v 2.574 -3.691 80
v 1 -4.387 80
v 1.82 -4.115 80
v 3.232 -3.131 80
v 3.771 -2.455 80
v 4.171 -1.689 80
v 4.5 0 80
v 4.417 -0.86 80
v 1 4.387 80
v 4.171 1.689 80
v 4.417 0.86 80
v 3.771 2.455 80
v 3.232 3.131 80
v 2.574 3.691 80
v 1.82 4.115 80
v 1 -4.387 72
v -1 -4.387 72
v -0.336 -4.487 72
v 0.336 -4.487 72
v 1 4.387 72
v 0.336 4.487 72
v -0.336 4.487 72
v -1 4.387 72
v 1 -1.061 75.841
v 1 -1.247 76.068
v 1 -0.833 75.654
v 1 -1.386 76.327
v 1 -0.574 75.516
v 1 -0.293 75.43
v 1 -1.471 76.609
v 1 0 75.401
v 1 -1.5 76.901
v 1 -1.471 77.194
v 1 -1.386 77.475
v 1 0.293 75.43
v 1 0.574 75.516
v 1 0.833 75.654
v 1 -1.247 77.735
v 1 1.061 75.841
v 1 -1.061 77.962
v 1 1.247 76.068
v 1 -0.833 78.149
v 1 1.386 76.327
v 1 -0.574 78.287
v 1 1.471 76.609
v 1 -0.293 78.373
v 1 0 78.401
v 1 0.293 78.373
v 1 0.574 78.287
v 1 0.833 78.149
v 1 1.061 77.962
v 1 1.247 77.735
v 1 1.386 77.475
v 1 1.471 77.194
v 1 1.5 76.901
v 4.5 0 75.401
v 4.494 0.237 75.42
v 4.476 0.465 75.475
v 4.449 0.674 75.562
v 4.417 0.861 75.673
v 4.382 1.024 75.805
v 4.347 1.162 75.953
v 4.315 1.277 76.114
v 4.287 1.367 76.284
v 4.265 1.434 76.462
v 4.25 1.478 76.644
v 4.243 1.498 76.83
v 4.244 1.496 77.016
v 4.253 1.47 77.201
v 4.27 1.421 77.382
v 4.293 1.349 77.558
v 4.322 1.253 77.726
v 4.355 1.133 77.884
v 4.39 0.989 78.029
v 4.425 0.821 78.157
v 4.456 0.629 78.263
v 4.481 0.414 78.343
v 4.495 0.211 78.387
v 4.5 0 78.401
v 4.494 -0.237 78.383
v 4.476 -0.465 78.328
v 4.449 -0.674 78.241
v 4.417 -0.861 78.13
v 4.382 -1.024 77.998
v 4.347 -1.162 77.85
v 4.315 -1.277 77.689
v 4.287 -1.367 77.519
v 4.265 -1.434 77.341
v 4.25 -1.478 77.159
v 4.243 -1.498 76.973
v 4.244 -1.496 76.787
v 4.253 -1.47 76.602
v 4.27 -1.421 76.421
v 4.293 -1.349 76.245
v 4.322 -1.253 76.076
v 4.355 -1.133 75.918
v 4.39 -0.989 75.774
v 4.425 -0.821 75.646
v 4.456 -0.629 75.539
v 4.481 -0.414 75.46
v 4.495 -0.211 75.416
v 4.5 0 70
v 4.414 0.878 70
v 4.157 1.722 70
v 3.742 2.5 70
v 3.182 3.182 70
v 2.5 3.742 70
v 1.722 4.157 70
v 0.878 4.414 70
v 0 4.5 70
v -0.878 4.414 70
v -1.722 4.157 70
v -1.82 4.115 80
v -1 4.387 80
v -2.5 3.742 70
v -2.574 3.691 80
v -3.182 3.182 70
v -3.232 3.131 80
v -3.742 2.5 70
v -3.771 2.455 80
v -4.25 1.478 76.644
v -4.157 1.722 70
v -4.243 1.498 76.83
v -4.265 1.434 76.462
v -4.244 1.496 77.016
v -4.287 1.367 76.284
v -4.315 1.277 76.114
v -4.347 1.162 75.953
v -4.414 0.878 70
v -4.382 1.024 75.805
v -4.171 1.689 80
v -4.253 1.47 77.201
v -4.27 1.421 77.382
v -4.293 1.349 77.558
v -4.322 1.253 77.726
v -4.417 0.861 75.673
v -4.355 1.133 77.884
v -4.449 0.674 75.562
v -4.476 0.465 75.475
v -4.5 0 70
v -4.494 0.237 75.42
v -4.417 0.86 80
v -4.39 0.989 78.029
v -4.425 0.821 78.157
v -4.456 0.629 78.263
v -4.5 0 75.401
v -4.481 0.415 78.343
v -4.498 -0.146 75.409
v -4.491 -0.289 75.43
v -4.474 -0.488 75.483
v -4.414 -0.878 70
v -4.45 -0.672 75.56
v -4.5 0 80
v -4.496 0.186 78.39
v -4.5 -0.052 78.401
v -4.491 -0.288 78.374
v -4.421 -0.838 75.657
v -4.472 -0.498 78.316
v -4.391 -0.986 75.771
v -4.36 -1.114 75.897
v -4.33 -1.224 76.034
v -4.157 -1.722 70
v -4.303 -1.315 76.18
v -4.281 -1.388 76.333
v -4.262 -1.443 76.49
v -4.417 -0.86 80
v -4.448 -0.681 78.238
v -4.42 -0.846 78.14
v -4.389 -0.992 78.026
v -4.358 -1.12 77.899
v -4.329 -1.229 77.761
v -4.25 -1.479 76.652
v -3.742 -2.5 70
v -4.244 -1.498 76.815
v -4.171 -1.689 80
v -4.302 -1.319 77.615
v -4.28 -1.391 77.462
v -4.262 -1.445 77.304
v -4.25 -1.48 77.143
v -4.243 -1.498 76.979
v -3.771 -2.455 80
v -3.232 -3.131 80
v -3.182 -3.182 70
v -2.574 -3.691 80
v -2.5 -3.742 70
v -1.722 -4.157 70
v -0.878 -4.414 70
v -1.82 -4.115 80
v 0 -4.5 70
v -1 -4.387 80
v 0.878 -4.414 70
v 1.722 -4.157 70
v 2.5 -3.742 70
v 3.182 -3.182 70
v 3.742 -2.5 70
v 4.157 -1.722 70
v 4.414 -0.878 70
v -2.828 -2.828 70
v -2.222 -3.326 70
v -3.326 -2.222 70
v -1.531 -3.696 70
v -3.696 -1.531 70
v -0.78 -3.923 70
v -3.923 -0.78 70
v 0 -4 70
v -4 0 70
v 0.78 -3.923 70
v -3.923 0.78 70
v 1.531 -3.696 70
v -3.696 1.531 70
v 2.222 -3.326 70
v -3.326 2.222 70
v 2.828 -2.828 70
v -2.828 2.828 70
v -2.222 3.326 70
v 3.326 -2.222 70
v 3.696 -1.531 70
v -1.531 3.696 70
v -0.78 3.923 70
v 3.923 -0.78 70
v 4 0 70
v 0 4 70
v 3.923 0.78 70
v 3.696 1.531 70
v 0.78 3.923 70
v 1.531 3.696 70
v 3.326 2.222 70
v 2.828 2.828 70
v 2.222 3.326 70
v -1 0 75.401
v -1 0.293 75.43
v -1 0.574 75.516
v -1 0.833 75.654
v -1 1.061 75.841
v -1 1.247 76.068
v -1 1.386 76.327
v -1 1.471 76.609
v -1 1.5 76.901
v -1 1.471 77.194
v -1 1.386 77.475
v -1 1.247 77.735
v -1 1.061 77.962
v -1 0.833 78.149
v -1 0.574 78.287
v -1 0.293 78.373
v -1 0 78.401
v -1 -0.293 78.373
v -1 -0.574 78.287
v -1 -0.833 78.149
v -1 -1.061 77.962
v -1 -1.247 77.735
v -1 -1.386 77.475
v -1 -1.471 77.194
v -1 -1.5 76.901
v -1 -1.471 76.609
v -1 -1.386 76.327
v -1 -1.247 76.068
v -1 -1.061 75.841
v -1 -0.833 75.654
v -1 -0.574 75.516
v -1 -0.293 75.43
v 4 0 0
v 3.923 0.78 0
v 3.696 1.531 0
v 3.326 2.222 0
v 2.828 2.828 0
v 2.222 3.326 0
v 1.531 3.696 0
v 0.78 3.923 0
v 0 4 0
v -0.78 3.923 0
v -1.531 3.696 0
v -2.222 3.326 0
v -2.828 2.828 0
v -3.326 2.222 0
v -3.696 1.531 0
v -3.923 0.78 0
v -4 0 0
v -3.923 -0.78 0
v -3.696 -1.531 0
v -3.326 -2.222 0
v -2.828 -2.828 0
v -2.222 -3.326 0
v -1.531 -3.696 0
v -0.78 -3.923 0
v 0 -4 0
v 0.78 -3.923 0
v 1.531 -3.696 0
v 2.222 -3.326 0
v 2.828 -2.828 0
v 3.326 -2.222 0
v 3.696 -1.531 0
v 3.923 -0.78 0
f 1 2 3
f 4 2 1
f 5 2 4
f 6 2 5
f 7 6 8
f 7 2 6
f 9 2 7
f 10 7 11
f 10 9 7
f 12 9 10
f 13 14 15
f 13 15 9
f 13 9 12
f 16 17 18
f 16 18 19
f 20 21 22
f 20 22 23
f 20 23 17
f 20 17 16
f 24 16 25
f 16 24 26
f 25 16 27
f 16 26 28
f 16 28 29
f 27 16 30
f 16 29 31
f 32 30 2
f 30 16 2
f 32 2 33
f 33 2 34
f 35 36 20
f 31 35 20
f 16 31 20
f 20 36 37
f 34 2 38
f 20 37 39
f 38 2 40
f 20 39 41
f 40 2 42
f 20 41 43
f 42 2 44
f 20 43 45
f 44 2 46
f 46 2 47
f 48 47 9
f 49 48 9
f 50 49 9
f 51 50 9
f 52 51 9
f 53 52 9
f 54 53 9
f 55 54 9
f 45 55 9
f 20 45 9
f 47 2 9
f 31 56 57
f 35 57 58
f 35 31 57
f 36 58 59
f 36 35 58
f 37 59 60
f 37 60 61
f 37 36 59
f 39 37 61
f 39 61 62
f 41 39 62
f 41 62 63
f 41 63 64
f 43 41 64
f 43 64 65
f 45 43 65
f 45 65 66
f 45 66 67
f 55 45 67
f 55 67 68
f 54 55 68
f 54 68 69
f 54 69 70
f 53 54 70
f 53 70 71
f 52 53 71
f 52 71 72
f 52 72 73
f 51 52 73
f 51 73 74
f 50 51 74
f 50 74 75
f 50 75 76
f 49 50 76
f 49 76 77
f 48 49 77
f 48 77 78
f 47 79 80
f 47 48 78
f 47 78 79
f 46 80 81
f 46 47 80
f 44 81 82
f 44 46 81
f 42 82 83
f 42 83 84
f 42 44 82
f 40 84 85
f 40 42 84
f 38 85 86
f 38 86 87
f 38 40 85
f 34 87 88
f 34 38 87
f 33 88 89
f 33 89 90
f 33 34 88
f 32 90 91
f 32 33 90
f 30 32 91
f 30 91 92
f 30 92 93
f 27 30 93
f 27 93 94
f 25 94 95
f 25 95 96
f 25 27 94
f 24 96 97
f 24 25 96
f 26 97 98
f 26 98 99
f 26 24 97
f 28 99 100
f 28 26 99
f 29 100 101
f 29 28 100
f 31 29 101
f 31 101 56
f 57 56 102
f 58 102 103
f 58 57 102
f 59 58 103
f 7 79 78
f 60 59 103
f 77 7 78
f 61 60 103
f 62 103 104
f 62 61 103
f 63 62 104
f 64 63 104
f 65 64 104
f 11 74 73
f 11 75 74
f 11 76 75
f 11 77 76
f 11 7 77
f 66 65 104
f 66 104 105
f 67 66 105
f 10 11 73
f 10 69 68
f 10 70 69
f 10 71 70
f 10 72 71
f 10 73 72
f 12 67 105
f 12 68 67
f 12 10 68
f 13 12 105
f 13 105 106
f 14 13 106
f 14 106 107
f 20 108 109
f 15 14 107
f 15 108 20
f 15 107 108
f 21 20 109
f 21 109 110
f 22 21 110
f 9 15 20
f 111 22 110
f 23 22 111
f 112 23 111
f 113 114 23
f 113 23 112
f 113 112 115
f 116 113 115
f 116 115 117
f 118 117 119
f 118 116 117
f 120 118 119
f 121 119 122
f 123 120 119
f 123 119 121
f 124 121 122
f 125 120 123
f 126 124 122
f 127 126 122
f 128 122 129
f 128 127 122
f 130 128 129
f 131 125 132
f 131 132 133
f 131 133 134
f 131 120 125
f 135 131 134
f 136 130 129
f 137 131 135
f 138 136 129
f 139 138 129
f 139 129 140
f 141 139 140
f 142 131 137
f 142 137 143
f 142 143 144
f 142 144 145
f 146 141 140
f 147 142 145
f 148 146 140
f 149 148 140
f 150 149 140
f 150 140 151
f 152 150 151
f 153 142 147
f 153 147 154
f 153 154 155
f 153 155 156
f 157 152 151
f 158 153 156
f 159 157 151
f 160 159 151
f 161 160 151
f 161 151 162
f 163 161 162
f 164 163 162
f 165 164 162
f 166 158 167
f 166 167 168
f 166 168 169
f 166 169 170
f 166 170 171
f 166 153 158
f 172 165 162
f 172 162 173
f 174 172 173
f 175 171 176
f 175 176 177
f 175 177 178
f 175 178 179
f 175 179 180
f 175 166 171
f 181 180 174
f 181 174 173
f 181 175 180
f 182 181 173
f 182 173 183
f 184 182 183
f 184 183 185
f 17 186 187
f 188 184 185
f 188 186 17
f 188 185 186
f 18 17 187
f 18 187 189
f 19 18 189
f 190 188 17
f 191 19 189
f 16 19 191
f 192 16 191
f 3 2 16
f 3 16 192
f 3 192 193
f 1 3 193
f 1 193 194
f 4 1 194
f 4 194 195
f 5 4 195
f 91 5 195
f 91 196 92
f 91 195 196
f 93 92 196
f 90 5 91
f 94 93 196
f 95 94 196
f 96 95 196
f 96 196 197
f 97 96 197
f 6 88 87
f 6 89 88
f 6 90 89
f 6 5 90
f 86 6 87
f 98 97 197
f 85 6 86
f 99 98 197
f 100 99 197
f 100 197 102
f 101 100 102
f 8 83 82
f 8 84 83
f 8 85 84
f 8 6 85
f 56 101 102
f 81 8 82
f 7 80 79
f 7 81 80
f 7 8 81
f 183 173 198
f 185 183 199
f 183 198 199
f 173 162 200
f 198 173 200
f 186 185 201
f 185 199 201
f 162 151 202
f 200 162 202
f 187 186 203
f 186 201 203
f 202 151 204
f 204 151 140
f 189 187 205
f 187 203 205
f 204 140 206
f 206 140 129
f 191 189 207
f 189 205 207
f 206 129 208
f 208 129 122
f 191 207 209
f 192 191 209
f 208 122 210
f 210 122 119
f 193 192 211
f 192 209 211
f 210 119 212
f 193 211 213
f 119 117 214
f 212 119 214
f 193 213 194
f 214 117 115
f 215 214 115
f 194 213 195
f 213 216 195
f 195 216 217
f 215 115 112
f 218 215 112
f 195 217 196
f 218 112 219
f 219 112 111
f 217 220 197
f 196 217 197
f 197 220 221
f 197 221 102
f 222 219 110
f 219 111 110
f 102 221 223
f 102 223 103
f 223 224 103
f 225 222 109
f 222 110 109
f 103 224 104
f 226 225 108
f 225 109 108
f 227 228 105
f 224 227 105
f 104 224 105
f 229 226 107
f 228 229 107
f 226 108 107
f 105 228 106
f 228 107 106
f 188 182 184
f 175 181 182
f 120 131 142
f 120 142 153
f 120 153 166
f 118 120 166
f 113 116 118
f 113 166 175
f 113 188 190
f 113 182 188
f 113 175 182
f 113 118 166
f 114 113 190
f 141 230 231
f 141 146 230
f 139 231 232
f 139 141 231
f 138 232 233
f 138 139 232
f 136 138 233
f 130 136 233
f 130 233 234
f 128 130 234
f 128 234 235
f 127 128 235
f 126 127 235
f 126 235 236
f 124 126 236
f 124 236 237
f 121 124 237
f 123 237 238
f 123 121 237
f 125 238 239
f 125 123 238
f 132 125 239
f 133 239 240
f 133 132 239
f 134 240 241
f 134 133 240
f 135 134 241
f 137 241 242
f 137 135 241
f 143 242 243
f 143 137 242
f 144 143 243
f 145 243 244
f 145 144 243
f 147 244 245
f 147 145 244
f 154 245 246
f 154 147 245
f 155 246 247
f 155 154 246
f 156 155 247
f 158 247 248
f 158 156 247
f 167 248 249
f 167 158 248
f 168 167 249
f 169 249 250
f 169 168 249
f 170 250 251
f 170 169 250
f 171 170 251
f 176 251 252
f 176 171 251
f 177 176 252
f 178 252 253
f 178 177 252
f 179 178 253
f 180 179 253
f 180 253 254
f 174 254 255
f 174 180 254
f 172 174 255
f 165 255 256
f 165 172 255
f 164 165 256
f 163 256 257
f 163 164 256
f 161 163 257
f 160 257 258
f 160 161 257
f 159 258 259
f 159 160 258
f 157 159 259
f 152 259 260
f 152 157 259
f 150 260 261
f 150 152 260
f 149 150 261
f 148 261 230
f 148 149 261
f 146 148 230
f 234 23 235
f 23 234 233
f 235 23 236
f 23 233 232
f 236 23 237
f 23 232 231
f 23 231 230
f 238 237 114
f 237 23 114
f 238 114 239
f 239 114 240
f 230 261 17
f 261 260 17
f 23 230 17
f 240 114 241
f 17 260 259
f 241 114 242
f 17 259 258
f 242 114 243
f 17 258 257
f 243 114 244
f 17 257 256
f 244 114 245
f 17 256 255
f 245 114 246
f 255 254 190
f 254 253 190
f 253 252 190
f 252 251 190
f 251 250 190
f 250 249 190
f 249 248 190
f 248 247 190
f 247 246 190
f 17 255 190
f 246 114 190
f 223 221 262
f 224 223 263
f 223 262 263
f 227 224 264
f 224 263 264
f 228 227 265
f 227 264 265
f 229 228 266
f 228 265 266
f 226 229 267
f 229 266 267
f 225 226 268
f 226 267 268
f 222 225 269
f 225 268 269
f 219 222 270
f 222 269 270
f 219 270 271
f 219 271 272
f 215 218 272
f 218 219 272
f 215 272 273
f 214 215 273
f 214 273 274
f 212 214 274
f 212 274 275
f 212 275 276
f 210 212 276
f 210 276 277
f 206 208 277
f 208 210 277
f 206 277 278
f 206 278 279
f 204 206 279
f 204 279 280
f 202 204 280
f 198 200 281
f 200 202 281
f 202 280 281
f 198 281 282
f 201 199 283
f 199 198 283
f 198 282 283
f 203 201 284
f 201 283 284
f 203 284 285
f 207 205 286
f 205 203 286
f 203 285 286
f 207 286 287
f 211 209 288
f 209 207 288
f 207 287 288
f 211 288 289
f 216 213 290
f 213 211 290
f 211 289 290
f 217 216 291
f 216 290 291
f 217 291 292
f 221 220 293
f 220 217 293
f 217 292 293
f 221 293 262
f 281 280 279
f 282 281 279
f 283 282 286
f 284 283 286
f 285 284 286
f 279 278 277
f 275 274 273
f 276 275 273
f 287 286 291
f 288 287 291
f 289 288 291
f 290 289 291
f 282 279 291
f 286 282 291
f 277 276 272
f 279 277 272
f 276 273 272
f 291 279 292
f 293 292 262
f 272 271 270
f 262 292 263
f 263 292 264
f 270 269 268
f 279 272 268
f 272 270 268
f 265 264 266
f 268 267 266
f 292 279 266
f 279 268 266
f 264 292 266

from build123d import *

# Parameters (mm, degrees)
SKETCH1_R               = 4
BOSS_EXTRUDE1_DEPTH     = 80
SKETCH2_R               = 4.5
BOSS_EXTRUDE2_DEPTH     = 10
SKETCH2_3_W             = 2
SKETCH2_3_H             = 11.355365006
CUT_EXTRUDE2_DEPTH      = 8
CUT_EXTRUDE3_DEPTH      = 81.25272581
CUT_EXTRUDE3_DEPTH_BACK = 81.25272581
SKETCH3_R               = 1.5


with BuildPart() as part:
    # Sketch1 → Boss-Extrude1 (new body)
    with BuildSketch(Plane.XY):
        Circle(SKETCH1_R)
    extrude(amount=BOSS_EXTRUDE1_DEPTH)

    # Sketch2 → Boss-Extrude2 (add)
    with BuildSketch(Plane.XY.offset(80)):
        Circle(SKETCH2_R)
    extrude(amount=-BOSS_EXTRUDE2_DEPTH)

    # Sketch2<3> → Cut-Extrude2 (cut)
    with BuildSketch(Plane.XY.offset(80)):
        Rectangle(SKETCH2_3_W, SKETCH2_3_H)
    extrude(amount=-CUT_EXTRUDE2_DEPTH, mode=Mode.SUBTRACT)

    # Sketch3 → Cut-Extrude3 (cut, two sides: drawn at the far end of the back side and taken through both)
    with BuildSketch(Plane(origin=(0, 0, 0), x_dir=(0, 0, -1), z_dir=(1, 0, 0)).offset(-CUT_EXTRUDE3_DEPTH_BACK)):
        with Locations((-76.901418772, 0)):
            Circle(SKETCH3_R)
    extrude(amount=CUT_EXTRUDE3_DEPTH + CUT_EXTRUDE3_DEPTH_BACK, mode=Mode.SUBTRACT)


solid = part.part
